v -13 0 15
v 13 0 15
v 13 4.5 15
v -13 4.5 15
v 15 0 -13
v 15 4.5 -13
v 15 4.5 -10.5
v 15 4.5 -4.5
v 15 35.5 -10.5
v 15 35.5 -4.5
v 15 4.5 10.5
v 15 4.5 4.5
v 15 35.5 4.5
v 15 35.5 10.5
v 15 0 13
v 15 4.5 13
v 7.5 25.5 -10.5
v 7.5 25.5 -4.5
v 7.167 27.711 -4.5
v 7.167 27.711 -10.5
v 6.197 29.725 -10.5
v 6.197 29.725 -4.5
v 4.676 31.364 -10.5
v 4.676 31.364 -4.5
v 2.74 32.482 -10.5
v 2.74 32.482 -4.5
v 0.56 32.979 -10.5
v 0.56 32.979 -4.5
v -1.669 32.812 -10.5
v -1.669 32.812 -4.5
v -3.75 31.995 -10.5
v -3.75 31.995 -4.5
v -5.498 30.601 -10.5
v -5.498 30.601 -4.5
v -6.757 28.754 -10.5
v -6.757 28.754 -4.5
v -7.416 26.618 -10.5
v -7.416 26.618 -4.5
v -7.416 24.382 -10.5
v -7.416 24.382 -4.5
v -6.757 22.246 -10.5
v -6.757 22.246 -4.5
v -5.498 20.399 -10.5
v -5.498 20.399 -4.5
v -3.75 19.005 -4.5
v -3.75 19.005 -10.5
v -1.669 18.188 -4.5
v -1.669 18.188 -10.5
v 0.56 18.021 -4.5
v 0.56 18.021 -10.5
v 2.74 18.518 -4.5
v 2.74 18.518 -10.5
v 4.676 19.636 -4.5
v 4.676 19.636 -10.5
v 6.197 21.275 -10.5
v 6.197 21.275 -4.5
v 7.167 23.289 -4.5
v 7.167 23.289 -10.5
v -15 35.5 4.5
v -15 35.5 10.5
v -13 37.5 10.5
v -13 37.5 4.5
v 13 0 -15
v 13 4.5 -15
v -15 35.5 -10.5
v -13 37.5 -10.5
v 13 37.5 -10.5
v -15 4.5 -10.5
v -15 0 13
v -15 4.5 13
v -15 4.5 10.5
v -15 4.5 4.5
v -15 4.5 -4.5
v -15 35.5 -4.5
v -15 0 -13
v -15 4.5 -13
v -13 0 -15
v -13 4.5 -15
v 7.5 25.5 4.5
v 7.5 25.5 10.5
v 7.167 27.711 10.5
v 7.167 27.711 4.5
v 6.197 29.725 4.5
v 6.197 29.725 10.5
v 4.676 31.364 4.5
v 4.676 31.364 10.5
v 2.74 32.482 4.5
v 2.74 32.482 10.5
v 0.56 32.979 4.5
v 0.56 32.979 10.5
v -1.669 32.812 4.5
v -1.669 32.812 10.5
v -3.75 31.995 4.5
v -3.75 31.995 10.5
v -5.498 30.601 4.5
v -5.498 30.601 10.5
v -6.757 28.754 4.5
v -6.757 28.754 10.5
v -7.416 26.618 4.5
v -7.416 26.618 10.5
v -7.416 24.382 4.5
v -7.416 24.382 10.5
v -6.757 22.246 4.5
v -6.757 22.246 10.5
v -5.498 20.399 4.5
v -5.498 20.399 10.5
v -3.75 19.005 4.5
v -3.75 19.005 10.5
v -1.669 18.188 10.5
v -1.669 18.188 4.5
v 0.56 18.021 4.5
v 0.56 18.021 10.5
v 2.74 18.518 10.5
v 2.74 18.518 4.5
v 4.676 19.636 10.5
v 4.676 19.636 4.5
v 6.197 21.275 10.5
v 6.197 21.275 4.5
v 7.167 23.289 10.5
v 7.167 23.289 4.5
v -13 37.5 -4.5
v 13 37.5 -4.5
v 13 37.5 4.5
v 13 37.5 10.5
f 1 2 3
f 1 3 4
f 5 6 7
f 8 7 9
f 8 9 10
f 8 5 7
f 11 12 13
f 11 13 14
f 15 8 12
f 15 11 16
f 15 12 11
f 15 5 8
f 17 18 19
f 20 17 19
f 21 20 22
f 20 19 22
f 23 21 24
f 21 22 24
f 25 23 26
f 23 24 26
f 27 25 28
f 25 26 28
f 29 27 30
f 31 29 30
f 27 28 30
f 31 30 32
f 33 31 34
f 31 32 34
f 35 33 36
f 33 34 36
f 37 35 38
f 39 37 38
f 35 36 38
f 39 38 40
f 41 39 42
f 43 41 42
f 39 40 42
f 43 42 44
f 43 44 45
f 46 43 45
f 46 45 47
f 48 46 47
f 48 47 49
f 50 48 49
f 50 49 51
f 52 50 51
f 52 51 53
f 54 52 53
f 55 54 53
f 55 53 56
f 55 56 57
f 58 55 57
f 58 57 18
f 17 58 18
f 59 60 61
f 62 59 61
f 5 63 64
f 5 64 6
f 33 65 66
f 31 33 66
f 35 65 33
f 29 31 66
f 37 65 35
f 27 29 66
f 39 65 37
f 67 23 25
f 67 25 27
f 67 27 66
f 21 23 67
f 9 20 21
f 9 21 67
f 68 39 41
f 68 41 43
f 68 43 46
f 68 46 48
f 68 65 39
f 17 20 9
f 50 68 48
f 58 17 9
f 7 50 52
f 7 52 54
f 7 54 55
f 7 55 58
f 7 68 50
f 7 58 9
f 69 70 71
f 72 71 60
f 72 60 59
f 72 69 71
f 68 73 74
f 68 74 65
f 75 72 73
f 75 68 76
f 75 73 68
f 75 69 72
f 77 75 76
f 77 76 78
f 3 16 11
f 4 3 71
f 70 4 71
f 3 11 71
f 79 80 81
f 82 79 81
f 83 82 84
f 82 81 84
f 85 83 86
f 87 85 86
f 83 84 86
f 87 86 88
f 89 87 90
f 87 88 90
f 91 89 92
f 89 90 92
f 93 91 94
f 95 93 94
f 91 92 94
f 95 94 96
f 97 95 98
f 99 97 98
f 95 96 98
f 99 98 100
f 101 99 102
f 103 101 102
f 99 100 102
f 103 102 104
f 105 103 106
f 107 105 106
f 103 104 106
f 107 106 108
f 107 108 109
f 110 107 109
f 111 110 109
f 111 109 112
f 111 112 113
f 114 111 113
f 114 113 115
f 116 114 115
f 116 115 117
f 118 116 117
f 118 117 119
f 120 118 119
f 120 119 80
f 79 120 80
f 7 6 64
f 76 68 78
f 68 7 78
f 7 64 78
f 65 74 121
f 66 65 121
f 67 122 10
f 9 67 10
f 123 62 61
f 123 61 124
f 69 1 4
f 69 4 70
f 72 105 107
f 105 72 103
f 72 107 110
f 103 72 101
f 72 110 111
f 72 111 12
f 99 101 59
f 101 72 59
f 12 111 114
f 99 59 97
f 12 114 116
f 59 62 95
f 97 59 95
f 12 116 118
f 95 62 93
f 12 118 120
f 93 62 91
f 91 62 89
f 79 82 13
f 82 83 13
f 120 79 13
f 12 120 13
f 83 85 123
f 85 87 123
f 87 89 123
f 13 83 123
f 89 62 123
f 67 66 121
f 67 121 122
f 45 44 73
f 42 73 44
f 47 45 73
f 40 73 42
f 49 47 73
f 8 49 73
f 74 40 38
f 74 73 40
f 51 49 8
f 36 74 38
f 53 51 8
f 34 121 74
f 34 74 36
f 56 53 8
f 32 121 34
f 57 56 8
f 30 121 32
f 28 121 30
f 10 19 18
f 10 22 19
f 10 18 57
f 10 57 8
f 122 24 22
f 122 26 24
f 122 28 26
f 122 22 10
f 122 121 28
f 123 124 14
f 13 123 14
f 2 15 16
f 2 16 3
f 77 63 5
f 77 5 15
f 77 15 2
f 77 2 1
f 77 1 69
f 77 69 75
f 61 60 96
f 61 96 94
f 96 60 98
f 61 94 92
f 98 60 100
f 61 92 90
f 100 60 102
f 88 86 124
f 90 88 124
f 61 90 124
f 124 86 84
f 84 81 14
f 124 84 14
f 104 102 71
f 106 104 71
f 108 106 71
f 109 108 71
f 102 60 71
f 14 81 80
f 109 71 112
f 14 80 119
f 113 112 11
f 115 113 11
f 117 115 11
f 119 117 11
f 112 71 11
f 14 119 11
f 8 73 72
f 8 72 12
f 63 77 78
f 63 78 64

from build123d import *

# Parameters (mm, degrees)
EXTRUDE_1_DEPTH     = 4.5
SKETCH_2_W          = 30
SKETCH_2_H          = 21
EXTRUDE_2_DEPTH     = 33
SKETCH_3_W          = 30
SKETCH_3_H          = 9
CUT_EXTRUDE_1_DEPTH = 33
SKETCH_4_R          = 7.5
CUT_EXTRUDE_2_DEPTH = 48.765049984
CUT_EXTRUDE_6_DEPTH = 48.765049984


with BuildPart() as part:
    # 草图1 → 凸台-拉伸1 (new body)
    with BuildSketch(Plane(origin=(0, 0, 0), x_dir=(1, 0, 0), z_dir=(0, 1, 0))):
        Polygon((-15, 13), (-13, 15), (13, 15), (15, 13), (15, -13), (13, -15), (-13, -15), (-15, -13), align=None)
    extrude(amount=EXTRUDE_1_DEPTH)

    # 草图2 → 凸台-拉伸2 (add)
    with BuildSketch(Plane(origin=(0, 4.5, 0), x_dir=(1, 0, 0), z_dir=(0, 1, 0))):
        Rectangle(SKETCH_2_W, SKETCH_2_H)
    extrude(amount=EXTRUDE_2_DEPTH)

    # 草图3 → 切除-拉伸1 (cut)
    with BuildSketch(Plane(origin=(0, 37.5, 0), x_dir=(1, 0, 0), z_dir=(0, 1, 0))):
        Rectangle(SKETCH_3_W, SKETCH_3_H)
    extrude(amount=-CUT_EXTRUDE_1_DEPTH, mode=Mode.SUBTRACT)

    # 草图4 → 切除-拉伸2 (cut, through all)
    with BuildSketch(Plane.XY.offset(10.5)):
        with Locations((0, 25.5)):
            Circle(SKETCH_4_R)
    extrude(amount=-CUT_EXTRUDE_2_DEPTH, mode=Mode.SUBTRACT)

    # 草图9 → 切除-拉伸6 (cut, through all)
    with BuildSketch(Plane.XY.offset(10.5)):
        Polygon((-15, 35.5), (-13, 37.5), (-15, 37.5), align=None)
        Polygon((13, 37.5), (15, 35.5), (15, 37.5), align=None)
    extrude(amount=-CUT_EXTRUDE_6_DEPTH, mode=Mode.SUBTRACT)


solid = part.part
